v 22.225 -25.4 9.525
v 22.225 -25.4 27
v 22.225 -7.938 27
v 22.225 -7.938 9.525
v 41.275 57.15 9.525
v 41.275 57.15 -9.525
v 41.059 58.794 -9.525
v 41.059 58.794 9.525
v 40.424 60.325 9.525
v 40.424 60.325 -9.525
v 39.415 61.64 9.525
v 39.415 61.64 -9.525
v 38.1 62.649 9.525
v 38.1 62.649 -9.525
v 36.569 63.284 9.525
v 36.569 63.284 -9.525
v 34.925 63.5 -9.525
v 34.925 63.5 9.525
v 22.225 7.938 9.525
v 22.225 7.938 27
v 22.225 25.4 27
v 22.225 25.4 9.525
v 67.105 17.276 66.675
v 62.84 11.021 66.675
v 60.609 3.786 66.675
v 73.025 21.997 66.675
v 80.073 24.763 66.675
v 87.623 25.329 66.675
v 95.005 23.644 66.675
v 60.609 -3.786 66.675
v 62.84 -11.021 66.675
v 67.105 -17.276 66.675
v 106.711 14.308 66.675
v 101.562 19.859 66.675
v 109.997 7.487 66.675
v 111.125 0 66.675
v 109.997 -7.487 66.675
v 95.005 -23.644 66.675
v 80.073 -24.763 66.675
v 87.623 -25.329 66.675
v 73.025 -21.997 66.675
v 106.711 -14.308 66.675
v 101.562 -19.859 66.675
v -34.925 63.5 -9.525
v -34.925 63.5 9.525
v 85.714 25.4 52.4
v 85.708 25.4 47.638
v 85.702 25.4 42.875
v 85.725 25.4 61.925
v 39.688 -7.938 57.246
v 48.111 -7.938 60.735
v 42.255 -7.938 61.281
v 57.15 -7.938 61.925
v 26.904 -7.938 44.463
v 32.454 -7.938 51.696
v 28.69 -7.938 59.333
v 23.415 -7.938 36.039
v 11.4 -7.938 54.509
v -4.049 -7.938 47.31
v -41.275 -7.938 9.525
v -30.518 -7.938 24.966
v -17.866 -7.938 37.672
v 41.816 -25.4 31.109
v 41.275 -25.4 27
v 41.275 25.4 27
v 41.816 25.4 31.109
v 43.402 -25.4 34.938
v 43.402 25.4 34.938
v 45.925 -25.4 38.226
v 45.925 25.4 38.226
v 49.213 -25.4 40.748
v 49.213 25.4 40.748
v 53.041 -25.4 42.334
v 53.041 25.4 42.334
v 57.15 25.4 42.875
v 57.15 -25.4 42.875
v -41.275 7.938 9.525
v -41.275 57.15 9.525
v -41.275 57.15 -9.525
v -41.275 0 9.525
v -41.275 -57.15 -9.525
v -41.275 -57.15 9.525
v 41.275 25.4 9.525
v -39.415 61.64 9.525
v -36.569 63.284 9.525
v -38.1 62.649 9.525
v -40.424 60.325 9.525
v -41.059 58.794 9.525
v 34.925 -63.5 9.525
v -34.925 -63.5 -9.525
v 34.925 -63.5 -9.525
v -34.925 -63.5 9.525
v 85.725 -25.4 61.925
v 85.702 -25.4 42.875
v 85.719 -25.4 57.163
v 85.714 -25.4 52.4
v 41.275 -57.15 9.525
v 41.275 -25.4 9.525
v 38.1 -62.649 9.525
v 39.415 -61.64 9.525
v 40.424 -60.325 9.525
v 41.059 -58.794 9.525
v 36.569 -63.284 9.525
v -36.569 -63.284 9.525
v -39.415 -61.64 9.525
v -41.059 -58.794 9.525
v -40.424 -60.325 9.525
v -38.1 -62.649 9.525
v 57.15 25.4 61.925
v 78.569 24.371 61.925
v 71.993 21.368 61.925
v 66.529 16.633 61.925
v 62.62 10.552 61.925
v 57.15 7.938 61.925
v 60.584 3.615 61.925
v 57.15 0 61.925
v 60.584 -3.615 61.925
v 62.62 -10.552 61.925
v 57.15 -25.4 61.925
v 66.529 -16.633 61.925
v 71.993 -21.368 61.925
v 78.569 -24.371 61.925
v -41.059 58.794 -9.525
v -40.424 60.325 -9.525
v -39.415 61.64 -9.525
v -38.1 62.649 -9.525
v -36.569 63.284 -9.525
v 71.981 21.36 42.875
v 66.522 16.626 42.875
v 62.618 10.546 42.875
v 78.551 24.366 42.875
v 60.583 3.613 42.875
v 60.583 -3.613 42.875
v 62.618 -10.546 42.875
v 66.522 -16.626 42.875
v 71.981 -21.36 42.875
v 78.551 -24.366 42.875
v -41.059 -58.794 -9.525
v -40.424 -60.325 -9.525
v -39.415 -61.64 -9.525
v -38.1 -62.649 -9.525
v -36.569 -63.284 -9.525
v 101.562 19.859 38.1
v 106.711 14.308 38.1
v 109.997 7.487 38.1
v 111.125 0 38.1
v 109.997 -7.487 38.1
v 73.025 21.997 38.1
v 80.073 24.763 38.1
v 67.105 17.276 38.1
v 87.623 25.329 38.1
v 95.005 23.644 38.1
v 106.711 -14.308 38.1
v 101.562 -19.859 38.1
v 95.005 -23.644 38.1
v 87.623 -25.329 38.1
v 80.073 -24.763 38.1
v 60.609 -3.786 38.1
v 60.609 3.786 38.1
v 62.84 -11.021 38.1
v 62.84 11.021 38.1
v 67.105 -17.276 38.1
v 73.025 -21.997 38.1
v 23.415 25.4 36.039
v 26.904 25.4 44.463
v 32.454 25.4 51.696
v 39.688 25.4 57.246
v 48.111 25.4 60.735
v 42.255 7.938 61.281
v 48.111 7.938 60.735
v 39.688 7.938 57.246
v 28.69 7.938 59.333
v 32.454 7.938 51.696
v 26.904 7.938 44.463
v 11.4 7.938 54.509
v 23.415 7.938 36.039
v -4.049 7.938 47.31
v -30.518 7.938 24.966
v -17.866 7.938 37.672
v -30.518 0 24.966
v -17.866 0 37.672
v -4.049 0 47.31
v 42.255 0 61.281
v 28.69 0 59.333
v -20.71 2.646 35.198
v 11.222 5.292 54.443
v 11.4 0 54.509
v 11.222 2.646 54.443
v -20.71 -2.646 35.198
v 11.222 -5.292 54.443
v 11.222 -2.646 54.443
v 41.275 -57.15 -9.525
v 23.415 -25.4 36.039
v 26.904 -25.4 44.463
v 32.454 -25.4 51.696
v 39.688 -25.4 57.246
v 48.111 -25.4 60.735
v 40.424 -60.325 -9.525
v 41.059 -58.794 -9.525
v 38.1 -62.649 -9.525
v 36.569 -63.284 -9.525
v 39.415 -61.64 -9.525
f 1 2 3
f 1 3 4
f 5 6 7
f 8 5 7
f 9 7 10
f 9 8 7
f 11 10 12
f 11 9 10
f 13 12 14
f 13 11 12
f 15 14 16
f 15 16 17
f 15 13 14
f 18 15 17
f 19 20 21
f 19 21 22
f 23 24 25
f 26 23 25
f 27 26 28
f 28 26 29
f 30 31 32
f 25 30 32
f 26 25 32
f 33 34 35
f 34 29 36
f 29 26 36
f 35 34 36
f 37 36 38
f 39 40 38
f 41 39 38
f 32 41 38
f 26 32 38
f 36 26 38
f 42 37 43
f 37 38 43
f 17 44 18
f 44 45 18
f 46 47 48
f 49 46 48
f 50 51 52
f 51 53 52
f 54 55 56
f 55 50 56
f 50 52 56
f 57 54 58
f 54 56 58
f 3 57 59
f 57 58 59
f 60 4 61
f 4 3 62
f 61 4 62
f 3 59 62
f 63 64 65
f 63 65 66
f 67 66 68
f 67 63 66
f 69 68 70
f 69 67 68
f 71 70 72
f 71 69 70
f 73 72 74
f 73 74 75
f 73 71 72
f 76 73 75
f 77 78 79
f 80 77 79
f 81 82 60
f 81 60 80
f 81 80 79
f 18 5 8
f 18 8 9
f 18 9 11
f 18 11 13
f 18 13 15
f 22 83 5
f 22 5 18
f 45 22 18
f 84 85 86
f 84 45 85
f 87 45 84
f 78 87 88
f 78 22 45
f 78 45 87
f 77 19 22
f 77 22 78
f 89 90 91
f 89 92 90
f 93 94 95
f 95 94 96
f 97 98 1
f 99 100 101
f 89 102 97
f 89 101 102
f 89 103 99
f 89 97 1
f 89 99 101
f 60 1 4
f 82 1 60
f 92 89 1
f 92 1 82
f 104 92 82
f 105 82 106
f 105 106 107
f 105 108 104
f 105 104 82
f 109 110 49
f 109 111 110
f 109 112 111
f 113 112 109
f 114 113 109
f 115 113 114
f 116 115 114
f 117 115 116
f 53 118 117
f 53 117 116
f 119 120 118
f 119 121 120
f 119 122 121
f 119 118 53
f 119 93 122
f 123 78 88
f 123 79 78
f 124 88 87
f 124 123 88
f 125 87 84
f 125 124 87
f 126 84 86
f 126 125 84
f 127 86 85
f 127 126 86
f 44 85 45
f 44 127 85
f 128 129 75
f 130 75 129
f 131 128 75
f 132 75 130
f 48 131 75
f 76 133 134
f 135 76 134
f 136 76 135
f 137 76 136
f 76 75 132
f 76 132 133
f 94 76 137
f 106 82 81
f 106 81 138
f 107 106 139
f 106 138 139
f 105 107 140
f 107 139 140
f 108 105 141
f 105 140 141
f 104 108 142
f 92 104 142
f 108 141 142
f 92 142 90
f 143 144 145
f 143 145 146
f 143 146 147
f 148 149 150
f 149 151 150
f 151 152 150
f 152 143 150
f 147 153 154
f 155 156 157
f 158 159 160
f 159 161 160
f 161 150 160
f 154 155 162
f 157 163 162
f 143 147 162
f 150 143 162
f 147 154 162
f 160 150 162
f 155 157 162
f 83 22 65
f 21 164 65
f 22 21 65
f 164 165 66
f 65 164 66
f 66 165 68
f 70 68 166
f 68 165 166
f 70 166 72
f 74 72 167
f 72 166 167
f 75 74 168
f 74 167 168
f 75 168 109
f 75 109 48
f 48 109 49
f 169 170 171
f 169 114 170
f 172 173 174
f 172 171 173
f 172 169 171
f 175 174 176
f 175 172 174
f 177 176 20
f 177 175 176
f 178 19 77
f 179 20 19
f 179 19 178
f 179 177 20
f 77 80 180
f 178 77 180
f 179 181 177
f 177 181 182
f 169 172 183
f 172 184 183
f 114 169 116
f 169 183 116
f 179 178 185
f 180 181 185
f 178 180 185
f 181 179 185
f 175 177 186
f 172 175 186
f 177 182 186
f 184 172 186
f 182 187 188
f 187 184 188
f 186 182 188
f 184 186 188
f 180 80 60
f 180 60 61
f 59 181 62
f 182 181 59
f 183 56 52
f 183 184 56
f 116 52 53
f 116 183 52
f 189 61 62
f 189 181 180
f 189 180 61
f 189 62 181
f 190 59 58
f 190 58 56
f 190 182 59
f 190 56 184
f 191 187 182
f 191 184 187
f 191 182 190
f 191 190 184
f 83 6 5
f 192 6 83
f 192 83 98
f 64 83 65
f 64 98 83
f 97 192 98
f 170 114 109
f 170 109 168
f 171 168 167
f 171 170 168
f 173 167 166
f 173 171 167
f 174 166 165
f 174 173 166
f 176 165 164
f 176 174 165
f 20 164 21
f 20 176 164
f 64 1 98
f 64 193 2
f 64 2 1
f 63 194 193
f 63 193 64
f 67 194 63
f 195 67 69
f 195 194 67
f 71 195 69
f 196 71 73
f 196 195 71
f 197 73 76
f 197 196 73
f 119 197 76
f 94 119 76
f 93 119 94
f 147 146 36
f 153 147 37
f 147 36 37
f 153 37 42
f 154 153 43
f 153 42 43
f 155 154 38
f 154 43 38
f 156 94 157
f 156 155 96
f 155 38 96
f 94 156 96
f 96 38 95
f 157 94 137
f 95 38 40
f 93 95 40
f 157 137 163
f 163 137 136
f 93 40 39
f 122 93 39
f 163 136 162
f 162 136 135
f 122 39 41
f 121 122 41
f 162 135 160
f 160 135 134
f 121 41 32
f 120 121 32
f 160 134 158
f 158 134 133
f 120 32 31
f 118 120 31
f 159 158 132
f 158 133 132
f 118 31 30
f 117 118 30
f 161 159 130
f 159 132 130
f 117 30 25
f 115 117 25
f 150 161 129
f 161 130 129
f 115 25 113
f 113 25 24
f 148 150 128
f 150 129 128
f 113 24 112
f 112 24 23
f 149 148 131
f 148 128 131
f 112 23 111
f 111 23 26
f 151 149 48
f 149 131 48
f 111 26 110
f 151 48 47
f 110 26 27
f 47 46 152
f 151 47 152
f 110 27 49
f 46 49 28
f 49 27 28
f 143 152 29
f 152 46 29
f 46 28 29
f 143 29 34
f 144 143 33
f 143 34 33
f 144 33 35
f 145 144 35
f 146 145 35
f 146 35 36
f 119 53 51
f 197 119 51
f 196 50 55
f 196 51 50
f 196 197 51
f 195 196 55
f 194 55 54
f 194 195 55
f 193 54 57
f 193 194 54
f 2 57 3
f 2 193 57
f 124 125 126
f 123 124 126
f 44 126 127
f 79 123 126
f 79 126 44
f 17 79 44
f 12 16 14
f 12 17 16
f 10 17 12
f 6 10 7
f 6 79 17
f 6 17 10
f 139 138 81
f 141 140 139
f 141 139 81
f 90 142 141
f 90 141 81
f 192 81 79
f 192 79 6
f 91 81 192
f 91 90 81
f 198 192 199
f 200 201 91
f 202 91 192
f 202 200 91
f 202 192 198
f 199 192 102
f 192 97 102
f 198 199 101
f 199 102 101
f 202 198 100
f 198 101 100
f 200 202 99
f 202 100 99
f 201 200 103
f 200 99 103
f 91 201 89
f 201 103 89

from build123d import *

# Parameters (mm, degrees)
F1_DEPTH = 63.5
F2_DEPTH = 25.4
F3_DEPTH = 7.9375
F5_R     = 6.35


with BuildPart() as f1:
    # F0 (on Front) → F1 (new body, symmetric)
    with BuildSketch(Plane.XZ):
        Polygon((-41.275, -9.525), (41.275, -9.525), (41.275, 9.525), (22.225, 9.525), (-41.275, 9.525), align=None)
    extrude(amount=F1_DEPTH, both=True)

    # F0 (on Front) → F2 (join, symmetric)
    with BuildSketch(Plane.XZ):
        with BuildLine():
            Line((22.225, 9.525), (41.275, 9.525))
            Line((41.275, 9.525), (41.275, 27.0002))
            ThreePointArc((41.275, 27.0002), (45.92468, 38.22552), (57.15, 42.8752))
            Line((57.15, 42.8752), (60.325, 42.8752))
            Line((60.325, 42.8752), (60.325, 61.9252))
            Line((60.325, 61.9252), (57.15, 61.9252))
            ThreePointArc((57.15, 61.9252), (32.454296, 51.695904), (22.225, 27.0002))
            Line((22.225, 27.0002), (22.225, 9.525))
        make_face()
        Polygon((85.725, 61.9252), (60.325, 61.9252), (60.325, 42.8752), (85.702203, 42.8752), align=None)
    extrude(amount=F2_DEPTH, both=True)

    # F0 (on Front) → F3 (join, symmetric)
    with BuildSketch(Plane.XZ):
        with BuildLine():
            add(Edge.make_bspline(
                [(-41.275, 9.525), (-25.517739, 36.63322), (3.348505, 62.103435), (57.15, 61.9252)],
                knots=[0, 0, 0, 0, 111.504536, 111.504536, 111.504536, 111.504536], degree=3))
            Line((-41.275, 9.525), (22.225, 9.525))
            Line((22.225, 9.525), (22.225, 27.0002))
            ThreePointArc((22.225, 27.0002), (32.454296, 51.695904), (57.15, 61.9252))
        make_face()
    extrude(amount=F3_DEPTH, both=True)

    # F0 (on Front) → F4 (revolve)
    with BuildSketch(Plane.XZ):
        Polygon((85.725, 66.675), (85.725, 61.9252), (85.725, 38.1), (111.125, 38.1), (111.125, 66.675), align=None)
    revolve(axis=Axis((85.725, 0, 52.3875), (0, 0, -1)))

    # F5
    f5_edges = [f1.edges().sort_by_distance(p)[0] for p in [
        (41.275, -63.5, 0),
        (41.275, 63.5, 0),
        (-41.275, -63.5, 0),
        (-41.275, 63.5, 0),
    ]]
    fillet(f5_edges, radius=F5_R)


solid = f1.part
